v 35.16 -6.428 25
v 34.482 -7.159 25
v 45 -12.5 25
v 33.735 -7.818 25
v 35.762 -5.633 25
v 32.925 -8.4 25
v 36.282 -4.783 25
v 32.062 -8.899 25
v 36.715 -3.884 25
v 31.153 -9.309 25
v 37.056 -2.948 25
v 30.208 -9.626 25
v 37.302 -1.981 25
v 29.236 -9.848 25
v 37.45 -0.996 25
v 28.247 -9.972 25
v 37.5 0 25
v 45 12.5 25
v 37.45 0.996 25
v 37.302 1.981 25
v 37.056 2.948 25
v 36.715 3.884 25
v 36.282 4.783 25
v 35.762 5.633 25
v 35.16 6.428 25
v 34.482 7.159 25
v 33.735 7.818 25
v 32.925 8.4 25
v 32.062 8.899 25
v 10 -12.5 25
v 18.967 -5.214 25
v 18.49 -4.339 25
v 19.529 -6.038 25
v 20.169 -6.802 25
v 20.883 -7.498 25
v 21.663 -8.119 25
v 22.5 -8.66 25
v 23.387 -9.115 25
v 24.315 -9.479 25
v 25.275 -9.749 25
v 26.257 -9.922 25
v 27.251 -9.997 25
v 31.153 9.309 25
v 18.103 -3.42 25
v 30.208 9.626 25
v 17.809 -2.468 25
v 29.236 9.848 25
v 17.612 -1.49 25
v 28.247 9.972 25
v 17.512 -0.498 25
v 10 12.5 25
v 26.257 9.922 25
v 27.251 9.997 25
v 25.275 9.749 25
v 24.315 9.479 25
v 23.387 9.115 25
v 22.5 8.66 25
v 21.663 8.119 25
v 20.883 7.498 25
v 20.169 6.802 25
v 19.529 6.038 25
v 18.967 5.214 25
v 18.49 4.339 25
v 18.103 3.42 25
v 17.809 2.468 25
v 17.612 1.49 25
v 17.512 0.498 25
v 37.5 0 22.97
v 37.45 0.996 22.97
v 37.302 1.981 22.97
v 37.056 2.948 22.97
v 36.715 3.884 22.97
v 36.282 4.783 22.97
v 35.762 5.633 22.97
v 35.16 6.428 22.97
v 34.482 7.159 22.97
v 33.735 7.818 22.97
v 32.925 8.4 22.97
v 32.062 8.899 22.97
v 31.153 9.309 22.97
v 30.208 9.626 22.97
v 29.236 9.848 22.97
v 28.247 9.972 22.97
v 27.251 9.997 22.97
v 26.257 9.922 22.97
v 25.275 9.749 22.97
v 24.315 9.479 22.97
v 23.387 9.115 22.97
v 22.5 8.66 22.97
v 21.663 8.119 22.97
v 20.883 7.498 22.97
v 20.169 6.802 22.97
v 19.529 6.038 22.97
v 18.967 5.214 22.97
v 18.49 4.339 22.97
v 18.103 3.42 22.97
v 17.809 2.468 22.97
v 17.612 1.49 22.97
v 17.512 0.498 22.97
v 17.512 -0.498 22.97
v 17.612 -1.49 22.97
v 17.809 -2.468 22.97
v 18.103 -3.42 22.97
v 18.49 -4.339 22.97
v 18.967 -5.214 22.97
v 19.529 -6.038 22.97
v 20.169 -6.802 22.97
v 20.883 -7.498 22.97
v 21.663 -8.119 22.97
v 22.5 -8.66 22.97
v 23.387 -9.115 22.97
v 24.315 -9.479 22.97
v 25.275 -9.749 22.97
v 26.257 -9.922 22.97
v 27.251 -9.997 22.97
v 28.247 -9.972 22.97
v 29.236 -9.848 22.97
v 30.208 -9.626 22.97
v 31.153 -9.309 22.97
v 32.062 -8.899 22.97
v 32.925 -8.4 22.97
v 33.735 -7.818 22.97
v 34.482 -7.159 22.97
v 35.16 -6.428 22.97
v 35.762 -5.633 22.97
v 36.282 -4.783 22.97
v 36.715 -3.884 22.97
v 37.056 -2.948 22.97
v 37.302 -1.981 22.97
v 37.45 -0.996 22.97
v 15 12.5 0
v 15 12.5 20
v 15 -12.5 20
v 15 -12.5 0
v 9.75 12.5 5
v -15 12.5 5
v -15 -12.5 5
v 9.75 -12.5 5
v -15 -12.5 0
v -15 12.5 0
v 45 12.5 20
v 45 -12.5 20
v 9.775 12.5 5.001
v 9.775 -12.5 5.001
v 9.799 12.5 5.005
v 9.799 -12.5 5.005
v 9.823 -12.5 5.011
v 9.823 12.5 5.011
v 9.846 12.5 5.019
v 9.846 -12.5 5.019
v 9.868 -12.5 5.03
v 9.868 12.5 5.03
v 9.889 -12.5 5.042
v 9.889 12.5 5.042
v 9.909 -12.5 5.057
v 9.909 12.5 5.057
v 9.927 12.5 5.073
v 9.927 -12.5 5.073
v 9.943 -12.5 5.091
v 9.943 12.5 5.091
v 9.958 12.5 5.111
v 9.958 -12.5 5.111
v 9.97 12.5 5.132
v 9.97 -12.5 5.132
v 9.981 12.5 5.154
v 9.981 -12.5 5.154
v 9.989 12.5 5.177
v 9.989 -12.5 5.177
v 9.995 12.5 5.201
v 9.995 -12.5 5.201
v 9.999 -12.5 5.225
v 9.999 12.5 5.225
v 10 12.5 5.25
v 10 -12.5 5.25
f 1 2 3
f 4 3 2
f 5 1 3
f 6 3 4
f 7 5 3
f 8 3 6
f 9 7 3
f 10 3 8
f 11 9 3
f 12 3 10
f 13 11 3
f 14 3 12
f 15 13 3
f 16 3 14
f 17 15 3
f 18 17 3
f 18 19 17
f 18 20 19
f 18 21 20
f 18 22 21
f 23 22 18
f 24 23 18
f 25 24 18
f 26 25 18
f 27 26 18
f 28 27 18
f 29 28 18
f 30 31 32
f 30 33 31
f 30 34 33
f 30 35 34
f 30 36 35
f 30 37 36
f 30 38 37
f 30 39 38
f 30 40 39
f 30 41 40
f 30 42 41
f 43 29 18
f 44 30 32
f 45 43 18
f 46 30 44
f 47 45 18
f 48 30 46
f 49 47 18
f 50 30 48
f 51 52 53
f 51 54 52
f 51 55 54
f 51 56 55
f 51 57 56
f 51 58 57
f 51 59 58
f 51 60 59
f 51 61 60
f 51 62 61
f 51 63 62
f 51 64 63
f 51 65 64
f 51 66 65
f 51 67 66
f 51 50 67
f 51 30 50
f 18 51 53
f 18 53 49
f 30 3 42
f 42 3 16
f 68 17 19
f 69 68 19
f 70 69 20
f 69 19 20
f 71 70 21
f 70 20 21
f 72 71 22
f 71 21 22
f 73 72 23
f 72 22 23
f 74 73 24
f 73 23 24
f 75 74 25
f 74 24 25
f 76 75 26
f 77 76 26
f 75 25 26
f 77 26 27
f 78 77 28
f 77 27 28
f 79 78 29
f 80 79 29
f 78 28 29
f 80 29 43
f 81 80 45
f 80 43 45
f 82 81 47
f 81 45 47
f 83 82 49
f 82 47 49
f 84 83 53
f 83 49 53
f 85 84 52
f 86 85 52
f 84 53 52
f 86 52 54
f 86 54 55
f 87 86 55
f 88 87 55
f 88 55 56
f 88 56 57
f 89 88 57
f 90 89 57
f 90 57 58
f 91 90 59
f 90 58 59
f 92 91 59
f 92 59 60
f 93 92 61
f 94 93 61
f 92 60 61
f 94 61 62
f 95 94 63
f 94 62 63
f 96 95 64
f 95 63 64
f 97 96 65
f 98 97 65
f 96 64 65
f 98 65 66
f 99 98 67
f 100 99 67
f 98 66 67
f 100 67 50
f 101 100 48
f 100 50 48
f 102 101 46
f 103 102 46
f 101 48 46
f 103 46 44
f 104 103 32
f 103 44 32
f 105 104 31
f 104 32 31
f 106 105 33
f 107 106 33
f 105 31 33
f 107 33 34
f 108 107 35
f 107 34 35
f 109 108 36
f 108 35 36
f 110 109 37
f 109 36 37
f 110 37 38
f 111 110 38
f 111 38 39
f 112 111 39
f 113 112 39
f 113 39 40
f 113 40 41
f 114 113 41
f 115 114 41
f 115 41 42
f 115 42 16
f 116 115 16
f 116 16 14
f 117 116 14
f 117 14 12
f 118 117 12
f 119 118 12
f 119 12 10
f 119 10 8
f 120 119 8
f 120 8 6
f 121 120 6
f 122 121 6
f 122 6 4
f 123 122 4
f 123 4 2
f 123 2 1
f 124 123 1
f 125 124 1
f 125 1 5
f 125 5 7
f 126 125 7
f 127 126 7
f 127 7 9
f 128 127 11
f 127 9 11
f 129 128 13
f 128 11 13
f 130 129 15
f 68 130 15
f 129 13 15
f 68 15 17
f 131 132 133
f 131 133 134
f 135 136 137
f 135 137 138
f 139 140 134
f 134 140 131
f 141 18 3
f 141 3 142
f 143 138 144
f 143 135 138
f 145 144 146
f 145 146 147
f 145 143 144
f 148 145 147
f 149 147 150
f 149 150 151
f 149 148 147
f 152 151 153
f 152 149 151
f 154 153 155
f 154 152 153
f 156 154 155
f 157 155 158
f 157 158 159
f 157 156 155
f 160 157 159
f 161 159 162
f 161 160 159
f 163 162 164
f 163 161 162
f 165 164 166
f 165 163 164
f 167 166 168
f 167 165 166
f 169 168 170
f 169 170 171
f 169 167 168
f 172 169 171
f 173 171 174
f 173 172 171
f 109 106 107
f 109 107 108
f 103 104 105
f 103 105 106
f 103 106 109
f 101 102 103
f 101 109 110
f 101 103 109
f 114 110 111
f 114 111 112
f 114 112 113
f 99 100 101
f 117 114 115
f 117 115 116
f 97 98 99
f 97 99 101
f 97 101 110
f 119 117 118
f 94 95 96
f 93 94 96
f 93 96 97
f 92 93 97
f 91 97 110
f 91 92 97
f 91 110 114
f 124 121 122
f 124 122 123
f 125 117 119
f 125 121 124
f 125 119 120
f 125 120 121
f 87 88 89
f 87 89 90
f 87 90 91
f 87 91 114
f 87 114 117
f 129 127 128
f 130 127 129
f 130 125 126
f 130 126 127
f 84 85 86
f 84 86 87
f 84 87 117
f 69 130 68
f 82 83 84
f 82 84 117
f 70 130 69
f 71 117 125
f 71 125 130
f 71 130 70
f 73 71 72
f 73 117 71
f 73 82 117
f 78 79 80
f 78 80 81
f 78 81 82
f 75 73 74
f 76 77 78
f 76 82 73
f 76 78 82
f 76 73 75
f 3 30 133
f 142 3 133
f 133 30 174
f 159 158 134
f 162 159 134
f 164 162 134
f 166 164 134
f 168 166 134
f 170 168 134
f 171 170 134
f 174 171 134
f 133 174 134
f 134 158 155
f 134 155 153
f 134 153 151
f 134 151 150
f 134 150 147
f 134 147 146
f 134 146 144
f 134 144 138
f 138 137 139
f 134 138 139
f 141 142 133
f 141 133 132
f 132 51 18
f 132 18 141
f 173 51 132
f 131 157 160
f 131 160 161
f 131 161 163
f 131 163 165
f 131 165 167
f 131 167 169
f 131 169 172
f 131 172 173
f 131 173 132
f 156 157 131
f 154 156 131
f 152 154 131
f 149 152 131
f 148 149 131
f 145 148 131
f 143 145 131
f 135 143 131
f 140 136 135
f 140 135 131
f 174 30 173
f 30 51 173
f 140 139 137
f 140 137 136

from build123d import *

# Parameters (mm, degrees)
ESQUISSE1_W             = 30
ESQUISSE1_H             = 25
BOSS_EXTRU_2_DEPTH      = 5
ESQUISSE2_W             = 20
ESQUISSE2_H             = 25
BOSS_EXTRU_4_DEPTH      = 5
ESQUISSE3_W             = 5
ESQUISSE3_H             = 25
BOSS_EXTRU_5_DEPTH      = 30
CONG_1_R                = 0.25
ESQUISSE4_R             = 10
ENL_V_MAT_EXTRU_1_DEPTH = 2.03


with BuildPart() as part:
    # Esquisse1 → Boss.-Extru.2 (new body)
    with BuildSketch(Plane.XY):
        Rectangle(ESQUISSE1_W, ESQUISSE1_H)
    extrude(amount=BOSS_EXTRU_2_DEPTH)

    # Esquisse2 → Boss.-Extru.4 (add)
    with BuildSketch(Plane(origin=(15, 0, 0), x_dir=(0, 0, -1), z_dir=(1, 0, 0))):
        with Locations((-15, 0)):
            Rectangle(ESQUISSE2_W, ESQUISSE2_H)
    extrude(amount=-BOSS_EXTRU_4_DEPTH)

    # Esquisse3 → Boss.-Extru.5 (add)
    with BuildSketch(Plane(origin=(15, 0, 0), x_dir=(0, 0, -1), z_dir=(1, 0, 0))):
        with Locations((-22.5, 0)):
            Rectangle(ESQUISSE3_W, ESQUISSE3_H)
    extrude(amount=BOSS_EXTRU_5_DEPTH)

    # Congé1
    cong_1_edges = [part.edges().sort_by_distance(p)[0] for p in [
        (10, 0, 5),
    ]]
    fillet(cong_1_edges, radius=CONG_1_R)

    # Esquisse4 → Enlèv. mat.-Extru.1 (cut)
    with BuildSketch(Plane.XY.offset(25)):
        with Locations((27.5, 0)):
            Circle(ESQUISSE4_R)
    extrude(amount=-ENL_V_MAT_EXTRU_1_DEPTH, mode=Mode.SUBTRACT)


solid = part.part
